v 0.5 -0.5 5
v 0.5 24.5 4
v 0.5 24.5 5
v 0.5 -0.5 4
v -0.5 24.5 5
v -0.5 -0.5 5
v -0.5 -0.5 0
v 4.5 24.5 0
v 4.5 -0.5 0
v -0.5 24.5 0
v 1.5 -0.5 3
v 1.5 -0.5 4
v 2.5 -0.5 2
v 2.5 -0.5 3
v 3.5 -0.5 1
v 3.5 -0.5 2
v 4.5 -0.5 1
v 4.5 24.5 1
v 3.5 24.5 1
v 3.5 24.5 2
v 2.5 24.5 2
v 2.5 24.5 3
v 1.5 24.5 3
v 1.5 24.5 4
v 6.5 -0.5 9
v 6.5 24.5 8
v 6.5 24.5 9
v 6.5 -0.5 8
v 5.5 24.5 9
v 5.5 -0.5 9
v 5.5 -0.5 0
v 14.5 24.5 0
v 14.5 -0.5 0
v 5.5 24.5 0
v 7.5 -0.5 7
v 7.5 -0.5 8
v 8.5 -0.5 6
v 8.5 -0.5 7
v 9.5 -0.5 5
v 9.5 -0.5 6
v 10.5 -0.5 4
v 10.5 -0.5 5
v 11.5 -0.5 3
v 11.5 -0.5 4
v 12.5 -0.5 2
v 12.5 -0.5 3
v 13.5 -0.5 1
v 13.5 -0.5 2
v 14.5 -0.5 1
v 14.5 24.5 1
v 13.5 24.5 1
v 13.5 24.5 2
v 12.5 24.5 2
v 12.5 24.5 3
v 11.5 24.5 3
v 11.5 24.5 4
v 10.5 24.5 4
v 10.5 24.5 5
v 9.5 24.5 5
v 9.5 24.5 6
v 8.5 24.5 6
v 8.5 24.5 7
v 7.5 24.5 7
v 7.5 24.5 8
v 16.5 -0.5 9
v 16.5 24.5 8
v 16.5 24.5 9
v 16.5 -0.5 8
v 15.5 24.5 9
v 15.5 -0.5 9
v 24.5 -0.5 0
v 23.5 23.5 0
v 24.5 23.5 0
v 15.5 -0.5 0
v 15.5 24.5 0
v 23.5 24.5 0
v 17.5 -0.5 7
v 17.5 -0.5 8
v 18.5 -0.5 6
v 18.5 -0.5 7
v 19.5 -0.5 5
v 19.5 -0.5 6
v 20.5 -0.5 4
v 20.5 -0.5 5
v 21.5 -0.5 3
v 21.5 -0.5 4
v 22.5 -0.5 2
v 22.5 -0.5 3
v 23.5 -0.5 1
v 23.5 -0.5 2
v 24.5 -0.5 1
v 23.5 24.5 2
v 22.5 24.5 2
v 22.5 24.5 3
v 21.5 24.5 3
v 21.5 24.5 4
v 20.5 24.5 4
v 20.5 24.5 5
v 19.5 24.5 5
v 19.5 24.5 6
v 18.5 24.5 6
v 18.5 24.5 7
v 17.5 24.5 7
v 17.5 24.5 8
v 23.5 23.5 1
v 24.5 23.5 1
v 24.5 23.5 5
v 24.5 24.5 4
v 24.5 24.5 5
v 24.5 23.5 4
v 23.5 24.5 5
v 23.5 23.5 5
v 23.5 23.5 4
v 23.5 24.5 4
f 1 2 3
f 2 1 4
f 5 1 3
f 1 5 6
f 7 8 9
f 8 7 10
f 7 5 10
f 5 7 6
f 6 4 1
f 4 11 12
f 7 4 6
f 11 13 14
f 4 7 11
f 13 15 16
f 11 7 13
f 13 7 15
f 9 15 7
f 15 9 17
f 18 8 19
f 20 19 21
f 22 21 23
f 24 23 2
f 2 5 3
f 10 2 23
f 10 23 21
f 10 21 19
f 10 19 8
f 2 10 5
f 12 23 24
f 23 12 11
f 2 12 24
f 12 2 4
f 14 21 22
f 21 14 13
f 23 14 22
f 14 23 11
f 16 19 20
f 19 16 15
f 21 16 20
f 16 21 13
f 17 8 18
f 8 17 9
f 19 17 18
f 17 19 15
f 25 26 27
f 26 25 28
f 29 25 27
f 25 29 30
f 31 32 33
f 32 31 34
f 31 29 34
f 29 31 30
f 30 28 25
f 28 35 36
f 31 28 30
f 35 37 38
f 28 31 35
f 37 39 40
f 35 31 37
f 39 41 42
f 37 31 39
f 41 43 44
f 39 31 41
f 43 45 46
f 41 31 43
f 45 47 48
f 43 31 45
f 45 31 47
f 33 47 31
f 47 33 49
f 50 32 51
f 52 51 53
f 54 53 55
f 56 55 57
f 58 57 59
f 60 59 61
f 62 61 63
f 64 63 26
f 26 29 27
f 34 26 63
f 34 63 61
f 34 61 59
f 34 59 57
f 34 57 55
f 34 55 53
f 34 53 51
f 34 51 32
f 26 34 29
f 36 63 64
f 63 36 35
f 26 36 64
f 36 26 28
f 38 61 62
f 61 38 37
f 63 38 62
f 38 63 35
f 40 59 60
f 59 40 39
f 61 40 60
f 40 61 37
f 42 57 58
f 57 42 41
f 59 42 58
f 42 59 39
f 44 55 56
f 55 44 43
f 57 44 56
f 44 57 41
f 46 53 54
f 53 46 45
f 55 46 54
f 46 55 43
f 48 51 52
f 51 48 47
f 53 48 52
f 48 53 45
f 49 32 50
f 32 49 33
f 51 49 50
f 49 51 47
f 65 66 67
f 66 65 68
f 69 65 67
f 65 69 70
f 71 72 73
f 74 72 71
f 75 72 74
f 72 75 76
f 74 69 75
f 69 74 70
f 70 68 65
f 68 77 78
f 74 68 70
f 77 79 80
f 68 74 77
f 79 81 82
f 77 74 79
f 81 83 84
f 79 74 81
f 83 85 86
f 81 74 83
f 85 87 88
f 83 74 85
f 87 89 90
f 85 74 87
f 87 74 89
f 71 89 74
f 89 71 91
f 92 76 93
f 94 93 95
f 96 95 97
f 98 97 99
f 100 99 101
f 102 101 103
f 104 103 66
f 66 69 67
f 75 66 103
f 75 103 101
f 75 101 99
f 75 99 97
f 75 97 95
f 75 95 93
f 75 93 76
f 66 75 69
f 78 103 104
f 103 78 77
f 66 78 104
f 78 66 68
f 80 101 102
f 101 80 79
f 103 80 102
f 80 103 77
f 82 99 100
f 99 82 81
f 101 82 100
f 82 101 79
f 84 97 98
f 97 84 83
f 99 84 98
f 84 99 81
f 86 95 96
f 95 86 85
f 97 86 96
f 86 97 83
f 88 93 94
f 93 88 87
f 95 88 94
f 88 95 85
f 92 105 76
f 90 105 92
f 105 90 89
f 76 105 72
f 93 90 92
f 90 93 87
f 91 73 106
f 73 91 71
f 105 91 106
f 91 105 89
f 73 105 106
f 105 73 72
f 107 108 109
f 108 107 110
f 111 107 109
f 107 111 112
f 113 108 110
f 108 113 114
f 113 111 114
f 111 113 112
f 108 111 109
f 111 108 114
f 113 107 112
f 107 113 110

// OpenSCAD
union() {
    translate([0, 0, 2.5]) cube([1, 1, 5], center=true);
    translate([0, 1, 2.5]) cube([1, 1, 5], center=true);
    translate([0, 2, 2.5]) cube([1, 1, 5], center=true);
    translate([0, 3, 2.5]) cube([1, 1, 5], center=true);
    translate([0, 4, 2.5]) cube([1, 1, 5], center=true);
    translate([0, 5, 2.5]) cube([1, 1, 5], center=true);
    translate([0, 6, 2.5]) cube([1, 1, 5], center=true);
    translate([0, 7, 2.5]) cube([1, 1, 5], center=true);
    translate([0, 8, 2.5]) cube([1, 1, 5], center=true);
    translate([0, 9, 2.5]) cube([1, 1, 5], center=true);
    translate([0, 10, 2.5]) cube([1, 1, 5], center=true);
    translate([0, 11, 2.5]) cube([1, 1, 5], center=true);
    translate([0, 12, 2.5]) cube([1, 1, 5], center=true);
    translate([0, 13, 2.5]) cube([1, 1, 5], center=true);
    translate([0, 14, 2.5]) cube([1, 1, 5], center=true);
    translate([0, 15, 2.5]) cube([1, 1, 5], center=true);
    translate([0, 16, 2.5]) cube([1, 1, 5], center=true);
    translate([0, 17, 2.5]) cube([1, 1, 5], center=true);
    translate([0, 18, 2.5]) cube([1, 1, 5], center=true);
    translate([0, 19, 2.5]) cube([1, 1, 5], center=true);
    translate([0, 20, 2.5]) cube([1, 1, 5], center=true);
    translate([0, 21, 2.5]) cube([1, 1, 5], center=true);
    translate([0, 22, 2.5]) cube([1, 1, 5], center=true);
    translate([0, 23, 2.5]) cube([1, 1, 5], center=true);
    translate([0, 24, 2.5]) cube([1, 1, 5], center=true);
    translate([1, 0, 2.0]) cube([1, 1, 4], center=true);
    translate([1, 1, 2.0]) cube([1, 1, 4], center=true);
    translate([1, 2, 2.0]) cube([1, 1, 4], center=true);
    translate([1, 3, 2.0]) cube([1, 1, 4], center=true);
    translate([1, 4, 2.0]) cube([1, 1, 4], center=true);
    translate([1, 5, 2.0]) cube([1, 1, 4], center=true);
    translate([1, 6, 2.0]) cube([1, 1, 4], center=true);
    translate([1, 7, 2.0]) cube([1, 1, 4], center=true);
    translate([1, 8, 2.0]) cube([1, 1, 4], center=true);
    translate([1, 9, 2.0]) cube([1, 1, 4], center=true);
    translate([1, 10, 2.0]) cube([1, 1, 4], center=true);
    translate([1, 11, 2.0]) cube([1, 1, 4], center=true);
    translate([1, 12, 2.0]) cube([1, 1, 4], center=true);
    translate([1, 13, 2.0]) cube([1, 1, 4], center=true);
    translate([1, 14, 2.0]) cube([1, 1, 4], center=true);
    translate([1, 15, 2.0]) cube([1, 1, 4], center=true);
    translate([1, 16, 2.0]) cube([1, 1, 4], center=true);
    translate([1, 17, 2.0]) cube([1, 1, 4], center=true);
    translate([1, 18, 2.0]) cube([1, 1, 4], center=true);
    translate([1, 19, 2.0]) cube([1, 1, 4], center=true);
    translate([1, 20, 2.0]) cube([1, 1, 4], center=true);
    translate([1, 21, 2.0]) cube([1, 1, 4], center=true);
    translate([1, 22, 2.0]) cube([1, 1, 4], center=true);
    translate([1, 23, 2.0]) cube([1, 1, 4], center=true);
    translate([1, 24, 2.0]) cube([1, 1, 4], center=true);
    translate([2, 0, 1.5]) cube([1, 1, 3], center=true);
    translate([2, 1, 1.5]) cube([1, 1, 3], center=true);
    translate([2, 2, 1.5]) cube([1, 1, 3], center=true);
    translate([2, 3, 1.5]) cube([1, 1, 3], center=true);
    translate([2, 4, 1.5]) cube([1, 1, 3], center=true);
    translate([2, 5, 1.5]) cube([1, 1, 3], center=true);
    translate([2, 6, 1.5]) cube([1, 1, 3], center=true);
    translate([2, 7, 1.5]) cube([1, 1, 3], center=true);
    translate([2, 8, 1.5]) cube([1, 1, 3], center=true);
    translate([2, 9, 1.5]) cube([1, 1, 3], center=true);
    translate([2, 10, 1.5]) cube([1, 1, 3], center=true);
    translate([2, 11, 1.5]) cube([1, 1, 3], center=true);
    translate([2, 12, 1.5]) cube([1, 1, 3], center=true);
    translate([2, 13, 1.5]) cube([1, 1, 3], center=true);
    translate([2, 14, 1.5]) cube([1, 1, 3], center=true);
    translate([2, 15, 1.5]) cube([1, 1, 3], center=true);
    translate([2, 16, 1.5]) cube([1, 1, 3], center=true);
    translate([2, 17, 1.5]) cube([1, 1, 3], center=true);
    translate([2, 18, 1.5]) cube([1, 1, 3], center=true);
    translate([2, 19, 1.5]) cube([1, 1, 3], center=true);
    translate([2, 20, 1.5]) cube([1, 1, 3], center=true);
    translate([2, 21, 1.5]) cube([1, 1, 3], center=true);
    translate([2, 22, 1.5]) cube([1, 1, 3], center=true);
    translate([2, 23, 1.5]) cube([1, 1, 3], center=true);
    translate([2, 24, 1.5]) cube([1, 1, 3], center=true);
    translate([3, 0, 1.0]) cube([1, 1, 2], center=true);
    translate([3, 1, 1.0]) cube([1, 1, 2], center=true);
    translate([3, 2, 1.0]) cube([1, 1, 2], center=true);
    translate([3, 3, 1.0]) cube([1, 1, 2], center=true);
    translate([3, 4, 1.0]) cube([1, 1, 2], center=true);
    translate([3, 5, 1.0]) cube([1, 1, 2], center=true);
    translate([3, 6, 1.0]) cube([1, 1, 2], center=true);
    translate([3, 7, 1.0]) cube([1, 1, 2], center=true);
    translate([3, 8, 1.0]) cube([1, 1, 2], center=true);
    translate([3, 9, 1.0]) cube([1, 1, 2], center=true);
    translate([3, 10, 1.0]) cube([1, 1, 2], center=true);
    translate([3, 11, 1.0]) cube([1, 1, 2], center=true);
    translate([3, 12, 1.0]) cube([1, 1, 2], center=true);
    translate([3, 13, 1.0]) cube([1, 1, 2], center=true);
    translate([3, 14, 1.0]) cube([1, 1, 2], center=true);
    translate([3, 15, 1.0]) cube([1, 1, 2], center=true);
    translate([3, 16, 1.0]) cube([1, 1, 2], center=true);
    translate([3, 17, 1.0]) cube([1, 1, 2], center=true);
    translate([3, 18, 1.0]) cube([1, 1, 2], center=true);
    translate([3, 19, 1.0]) cube([1, 1, 2], center=true);
    translate([3, 20, 1.0]) cube([1, 1, 2], center=true);
    translate([3, 21, 1.0]) cube([1, 1, 2], center=true);
    translate([3, 22, 1.0]) cube([1, 1, 2], center=true);
    translate([3, 23, 1.0]) cube([1, 1, 2], center=true);
    translate([3, 24, 1.0]) cube([1, 1, 2], center=true);
    translate([4, 0, 0.5]) cube([1, 1, 1], center=true);
    translate([4, 1, 0.5]) cube([1, 1, 1], center=true);
    translate([4, 2, 0.5]) cube([1, 1, 1], center=true);
    translate([4, 3, 0.5]) cube([1, 1, 1], center=true);
    translate([4, 4, 0.5]) cube([1, 1, 1], center=true);
    translate([4, 5, 0.5]) cube([1, 1, 1], center=true);
    translate([4, 6, 0.5]) cube([1, 1, 1], center=true);
    translate([4, 7, 0.5]) cube([1, 1, 1], center=true);
    translate([4, 8, 0.5]) cube([1, 1, 1], center=true);
    translate([4, 9, 0.5]) cube([1, 1, 1], center=true);
    translate([4, 10, 0.5]) cube([1, 1, 1], center=true);
    translate([4, 11, 0.5]) cube([1, 1, 1], center=true);
    translate([4, 12, 0.5]) cube([1, 1, 1], center=true);
    translate([4, 13, 0.5]) cube([1, 1, 1], center=true);
    translate([4, 14, 0.5]) cube([1, 1, 1], center=true);
    translate([4, 15, 0.5]) cube([1, 1, 1], center=true);
    translate([4, 16, 0.5]) cube([1, 1, 1], center=true);
    translate([4, 17, 0.5]) cube([1, 1, 1], center=true);
    translate([4, 18, 0.5]) cube([1, 1, 1], center=true);
    translate([4, 19, 0.5]) cube([1, 1, 1], center=true);
    translate([4, 20, 0.5]) cube([1, 1, 1], center=true);
    translate([4, 21, 0.5]) cube([1, 1, 1], center=true);
    translate([4, 22, 0.5]) cube([1, 1, 1], center=true);
    translate([4, 23, 0.5]) cube([1, 1, 1], center=true);
    translate([4, 24, 0.5]) cube([1, 1, 1], center=true);
    translate([6, 0, 4.5]) cube([1, 1, 9], center=true);
    translate([6, 1, 4.5]) cube([1, 1, 9], center=true);
    translate([6, 2, 4.5]) cube([1, 1, 9], center=true);
    translate([6, 3, 4.5]) cube([1, 1, 9], center=true);
    translate([6, 4, 4.5]) cube([1, 1, 9], center=true);
    translate([6, 5, 4.5]) cube([1, 1, 9], center=true);
    translate([6, 6, 4.5]) cube([1, 1, 9], center=true);
    translate([6, 7, 4.5]) cube([1, 1, 9], center=true);
    translate([6, 8, 4.5]) cube([1, 1, 9], center=true);
    translate([6, 9, 4.5]) cube([1, 1, 9], center=true);
    translate([6, 10, 4.5]) cube([1, 1, 9], center=true);
    translate([6, 11, 4.5]) cube([1, 1, 9], center=true);
    translate([6, 12, 4.5]) cube([1, 1, 9], center=true);
    translate([6, 13, 4.5]) cube([1, 1, 9], center=true);
    translate([6, 14, 4.5]) cube([1, 1, 9], center=true);
    translate([6, 15, 4.5]) cube([1, 1, 9], center=true);
    translate([6, 16, 4.5]) cube([1, 1, 9], center=true);
    translate([6, 17, 4.5]) cube([1, 1, 9], center=true);
    translate([6, 18, 4.5]) cube([1, 1, 9], center=true);
    translate([6, 19, 4.5]) cube([1, 1, 9], center=true);
    translate([6, 20, 4.5]) cube([1, 1, 9], center=true);
    translate([6, 21, 4.5]) cube([1, 1, 9], center=true);
    translate([6, 22, 4.5]) cube([1, 1, 9], center=true);
    translate([6, 23, 4.5]) cube([1, 1, 9], center=true);
    translate([6, 24, 4.5]) cube([1, 1, 9], center=true);
    translate([7, 0, 4.0]) cube([1, 1, 8], center=true);
    translate([7, 1, 4.0]) cube([1, 1, 8], center=true);
    translate([7, 2, 4.0]) cube([1, 1, 8], center=true);
    translate([7, 3, 4.0]) cube([1, 1, 8], center=true);
    translate([7, 4, 4.0]) cube([1, 1, 8], center=true);
    translate([7, 5, 4.0]) cube([1, 1, 8], center=true);
    translate([7, 6, 4.0]) cube([1, 1, 8], center=true);
    translate([7, 7, 4.0]) cube([1, 1, 8], center=true);
    translate([7, 8, 4.0]) cube([1, 1, 8], center=true);
    translate([7, 9, 4.0]) cube([1, 1, 8], center=true);
    translate([7, 10, 4.0]) cube([1, 1, 8], center=true);
    translate([7, 11, 4.0]) cube([1, 1, 8], center=true);
    translate([7, 12, 4.0]) cube([1, 1, 8], center=true);
    translate([7, 13, 4.0]) cube([1, 1, 8], center=true);
    translate([7, 14, 4.0]) cube([1, 1, 8], center=true);
    translate([7, 15, 4.0]) cube([1, 1, 8], center=true);
    translate([7, 16, 4.0]) cube([1, 1, 8], center=true);
    translate([7, 17, 4.0]) cube([1, 1, 8], center=true);
    translate([7, 18, 4.0]) cube([1, 1, 8], center=true);
    translate([7, 19, 4.0]) cube([1, 1, 8], center=true);
    translate([7, 20, 4.0]) cube([1, 1, 8], center=true);
    translate([7, 21, 4.0]) cube([1, 1, 8], center=true);
    translate([7, 22, 4.0]) cube([1, 1, 8], center=true);
    translate([7, 23, 4.0]) cube([1, 1, 8], center=true);
    translate([7, 24, 4.0]) cube([1, 1, 8], center=true);
    translate([8, 0, 3.5]) cube([1, 1, 7], center=true);
    translate([8, 1, 3.5]) cube([1, 1, 7], center=true);
    translate([8, 2, 3.5]) cube([1, 1, 7], center=true);
    translate([8, 3, 3.5]) cube([1, 1, 7], center=true);
    translate([8, 4, 3.5]) cube([1, 1, 7], center=true);
    translate([8, 5, 3.5]) cube([1, 1, 7], center=true);
    translate([8, 6, 3.5]) cube([1, 1, 7], center=true);
    translate([8, 7, 3.5]) cube([1, 1, 7], center=true);
    translate([8, 8, 3.5]) cube([1, 1, 7], center=true);
    translate([8, 9, 3.5]) cube([1, 1, 7], center=true);
    translate([8, 10, 3.5]) cube([1, 1, 7], center=true);
    translate([8, 11, 3.5]) cube([1, 1, 7], center=true);
    translate([8, 12, 3.5]) cube([1, 1, 7], center=true);
    translate([8, 13, 3.5]) cube([1, 1, 7], center=true);
    translate([8, 14, 3.5]) cube([1, 1, 7], center=true);
    translate([8, 15, 3.5]) cube([1, 1, 7], center=true);
    translate([8, 16, 3.5]) cube([1, 1, 7], center=true);
    translate([8, 17, 3.5]) cube([1, 1, 7], center=true);
    translate([8, 18, 3.5]) cube([1, 1, 7], center=true);
    translate([8, 19, 3.5]) cube([1, 1, 7], center=true);
    translate([8, 20, 3.5]) cube([1, 1, 7], center=true);
    translate([8, 21, 3.5]) cube([1, 1, 7], center=true);
    translate([8, 22, 3.5]) cube([1, 1, 7], center=true);
    translate([8, 23, 3.5]) cube([1, 1, 7], center=true);
    translate([8, 24, 3.5]) cube([1, 1, 7], center=true);
    translate([9, 0, 3.0]) cube([1, 1, 6], center=true);
    translate([9, 1, 3.0]) cube([1, 1, 6], center=true);
    translate([9, 2, 3.0]) cube([1, 1, 6], center=true);
    translate([9, 3, 3.0]) cube([1, 1, 6], center=true);
    translate([9, 4, 3.0]) cube([1, 1, 6], center=true);
    translate([9, 5, 3.0]) cube([1, 1, 6], center=true);
    translate([9, 6, 3.0]) cube([1, 1, 6], center=true);
    translate([9, 7, 3.0]) cube([1, 1, 6], center=true);
    translate([9, 8, 3.0]) cube([1, 1, 6], center=true);
    translate([9, 9, 3.0]) cube([1, 1, 6], center=true);
    translate([9, 10, 3.0]) cube([1, 1, 6], center=true);
    translate([9, 11, 3.0]) cube([1, 1, 6], center=true);
    translate([9, 12, 3.0]) cube([1, 1, 6], center=true);
    translate([9, 13, 3.0]) cube([1, 1, 6], center=true);
    translate([9, 14, 3.0]) cube([1, 1, 6], center=true);
    translate([9, 15, 3.0]) cube([1, 1, 6], center=true);
    translate([9, 16, 3.0]) cube([1, 1, 6], center=true);
    translate([9, 17, 3.0]) cube([1, 1, 6], center=true);
    translate([9, 18, 3.0]) cube([1, 1, 6], center=true);
    translate([9, 19, 3.0]) cube([1, 1, 6], center=true);
    translate([9, 20, 3.0]) cube([1, 1, 6], center=true);
    translate([9, 21, 3.0]) cube([1, 1, 6], center=true);
    translate([9, 22, 3.0]) cube([1, 1, 6], center=true);
    translate([9, 23, 3.0]) cube([1, 1, 6], center=true);
    translate([9, 24, 3.0]) cube([1, 1, 6], center=true);
    translate([10, 0, 2.5]) cube([1, 1, 5], center=true);
    translate([10, 1, 2.5]) cube([1, 1, 5], center=true);
    translate([10, 2, 2.5]) cube([1, 1, 5], center=true);
    translate([10, 3, 2.5]) cube([1, 1, 5], center=true);
    translate([10, 4, 2.5]) cube([1, 1, 5], center=true);
    translate([10, 5, 2.5]) cube([1, 1, 5], center=true);
    translate([10, 6, 2.5]) cube([1, 1, 5], center=true);
    translate([10, 7, 2.5]) cube([1, 1, 5], center=true);
    translate([10, 8, 2.5]) cube([1, 1, 5], center=true);
    translate([10, 9, 2.5]) cube([1, 1, 5], center=true);
    translate([10, 10, 2.5]) cube([1, 1, 5], center=true);
    translate([10, 11, 2.5]) cube([1, 1, 5], center=true);
    translate([10, 12, 2.5]) cube([1, 1, 5], center=true);
    translate([10, 13, 2.5]) cube([1, 1, 5], center=true);
    translate([10, 14, 2.5]) cube([1, 1, 5], center=true);
    translate([10, 15, 2.5]) cube([1, 1, 5], center=true);
    translate([10, 16, 2.5]) cube([1, 1, 5], center=true);
    translate([10, 17, 2.5]) cube([1, 1, 5], center=true);
    translate([10, 18, 2.5]) cube([1, 1, 5], center=true);
    translate([10, 19, 2.5]) cube([1, 1, 5], center=true);
    translate([10, 20, 2.5]) cube([1, 1, 5], center=true);
    translate([10, 21, 2.5]) cube([1, 1, 5], center=true);
    translate([10, 22, 2.5]) cube([1, 1, 5], center=true);
    translate([10, 23, 2.5]) cube([1, 1, 5], center=true);
    translate([10, 24, 2.5]) cube([1, 1, 5], center=true);
    translate([11, 0, 2.0]) cube([1, 1, 4], center=true);
    translate([11, 1, 2.0]) cube([1, 1, 4], center=true);
    translate([11, 2, 2.0]) cube([1, 1, 4], center=true);
    translate([11, 3, 2.0]) cube([1, 1, 4], center=true);
    translate([11, 4, 2.0]) cube([1, 1, 4], center=true);
    translate([11, 5, 2.0]) cube([1, 1, 4], center=true);
    translate([11, 6, 2.0]) cube([1, 1, 4], center=true);
    translate([11, 7, 2.0]) cube([1, 1, 4], center=true);
    translate([11, 8, 2.0]) cube([1, 1, 4], center=true);
    translate([11, 9, 2.0]) cube([1, 1, 4], center=true);
    translate([11, 10, 2.0]) cube([1, 1, 4], center=true);
    translate([11, 11, 2.0]) cube([1, 1, 4], center=true);
    translate([11, 12, 2.0]) cube([1, 1, 4], center=true);
    translate([11, 13, 2.0]) cube([1, 1, 4], center=true);
    translate([11, 14, 2.0]) cube([1, 1, 4], center=true);
    translate([11, 15, 2.0]) cube([1, 1, 4], center=true);
    translate([11, 16, 2.0]) cube([1, 1, 4], center=true);
    translate([11, 17, 2.0]) cube([1, 1, 4], center=true);
    translate([11, 18, 2.0]) cube([1, 1, 4], center=true);
    translate([11, 19, 2.0]) cube([1, 1, 4], center=true);
    translate([11, 20, 2.0]) cube([1, 1, 4], center=true);
    translate([11, 21, 2.0]) cube([1, 1, 4], center=true);
    translate([11, 22, 2.0]) cube([1, 1, 4], center=true);
    translate([11, 23, 2.0]) cube([1, 1, 4], center=true);
    translate([11, 24, 2.0]) cube([1, 1, 4], center=true);
    translate([12, 0, 1.5]) cube([1, 1, 3], center=true);
    translate([12, 1, 1.5]) cube([1, 1, 3], center=true);
    translate([12, 2, 1.5]) cube([1, 1, 3], center=true);
    translate([12, 3, 1.5]) cube([1, 1, 3], center=true);
    translate([12, 4, 1.5]) cube([1, 1, 3], center=true);
    translate([12, 5, 1.5]) cube([1, 1, 3], center=true);
    translate([12, 6, 1.5]) cube([1, 1, 3], center=true);
    translate([12, 7, 1.5]) cube([1, 1, 3], center=true);
    translate([12, 8, 1.5]) cube([1, 1, 3], center=true);
    translate([12, 9, 1.5]) cube([1, 1, 3], center=true);
    translate([12, 10, 1.5]) cube([1, 1, 3], center=true);
    translate([12, 11, 1.5]) cube([1, 1, 3], center=true);
    translate([12, 12, 1.5]) cube([1, 1, 3], center=true);
    translate([12, 13, 1.5]) cube([1, 1, 3], center=true);
    translate([12, 14, 1.5]) cube([1, 1, 3], center=true);
    translate([12, 15, 1.5]) cube([1, 1, 3], center=true);
    translate([12, 16, 1.5]) cube([1, 1, 3], center=true);
    translate([12, 17, 1.5]) cube([1, 1, 3], center=true);
    translate([12, 18, 1.5]) cube([1, 1, 3], center=true);
    translate([12, 19, 1.5]) cube([1, 1, 3], center=true);
    translate([12, 20, 1.5]) cube([1, 1, 3], center=true);
    translate([12, 21, 1.5]) cube([1, 1, 3], center=true);
    translate([12, 22, 1.5]) cube([1, 1, 3], center=true);
    translate([12, 23, 1.5]) cube([1, 1, 3], center=true);
    translate([12, 24, 1.5]) cube([1, 1, 3], center=true);
    translate([13, 0, 1.0]) cube([1, 1, 2], center=true);
    translate([13, 1, 1.0]) cube([1, 1, 2], center=true);
    translate([13, 2, 1.0]) cube([1, 1, 2], center=true);
    translate([13, 3, 1.0]) cube([1, 1, 2], center=true);
    translate([13, 4, 1.0]) cube([1, 1, 2], center=true);
    translate([13, 5, 1.0]) cube([1, 1, 2], center=true);
    translate([13, 6, 1.0]) cube([1, 1, 2], center=true);
    translate([13, 7, 1.0]) cube([1, 1, 2], center=true);
    translate([13, 8, 1.0]) cube([1, 1, 2], center=true);
    translate([13, 9, 1.0]) cube([1, 1, 2], center=true);
    translate([13, 10, 1.0]) cube([1, 1, 2], center=true);
    translate([13, 11, 1.0]) cube([1, 1, 2], center=true);
    translate([13, 12, 1.0]) cube([1, 1, 2], center=true);
    translate([13, 13, 1.0]) cube([1, 1, 2], center=true);
    translate([13, 14, 1.0]) cube([1, 1, 2], center=true);
    translate([13, 15, 1.0]) cube([1, 1, 2], center=true);
    translate([13, 16, 1.0]) cube([1, 1, 2], center=true);
    translate([13, 17, 1.0]) cube([1, 1, 2], center=true);
    translate([13, 18, 1.0]) cube([1, 1, 2], center=true);
    translate([13, 19, 1.0]) cube([1, 1, 2], center=true);
    translate([13, 20, 1.0]) cube([1, 1, 2], center=true);
    translate([13, 21, 1.0]) cube([1, 1, 2], center=true);
    translate([13, 22, 1.0]) cube([1, 1, 2], center=true);
    translate([13, 23, 1.0]) cube([1, 1, 2], center=true);
    translate([13, 24, 1.0]) cube([1, 1, 2], center=true);
    translate([14, 0, 0.5]) cube([1, 1, 1], center=true);
    translate([14, 1, 0.5]) cube([1, 1, 1], center=true);
    translate([14, 2, 0.5]) cube([1, 1, 1], center=true);
    translate([14, 3, 0.5]) cube([1, 1, 1], center=true);
    translate([14, 4, 0.5]) cube([1, 1, 1], center=true);
    translate([14, 5, 0.5]) cube([1, 1, 1], center=true);
    translate([14, 6, 0.5]) cube([1, 1, 1], center=true);
    translate([14, 7, 0.5]) cube([1, 1, 1], center=true);
    translate([14, 8, 0.5]) cube([1, 1, 1], center=true);
    translate([14, 9, 0.5]) cube([1, 1, 1], center=true);
    translate([14, 10, 0.5]) cube([1, 1, 1], center=true);
    translate([14, 11, 0.5]) cube([1, 1, 1], center=true);
    translate([14, 12, 0.5]) cube([1, 1, 1], center=true);
    translate([14, 13, 0.5]) cube([1, 1, 1], center=true);
    translate([14, 14, 0.5]) cube([1, 1, 1], center=true);
    translate([14, 15, 0.5]) cube([1, 1, 1], center=true);
    translate([14, 16, 0.5]) cube([1, 1, 1], center=true);
    translate([14, 17, 0.5]) cube([1, 1, 1], center=true);
    translate([14, 18, 0.5]) cube([1, 1, 1], center=true);
    translate([14, 19, 0.5]) cube([1, 1, 1], center=true);
    translate([14, 20, 0.5]) cube([1, 1, 1], center=true);
    translate([14, 21, 0.5]) cube([1, 1, 1], center=true);
    translate([14, 22, 0.5]) cube([1, 1, 1], center=true);
    translate([14, 23, 0.5]) cube([1, 1, 1], center=true);
    translate([14, 24, 0.5]) cube([1, 1, 1], center=true);
    translate([16, 0, 4.5]) cube([1, 1, 9], center=true);
    translate([16, 1, 4.5]) cube([1, 1, 9], center=true);
    translate([16, 2, 4.5]) cube([1, 1, 9], center=true);
    translate([16, 3, 4.5]) cube([1, 1, 9], center=true);
    translate([16, 4, 4.5]) cube([1, 1, 9], center=true);
    translate([16, 5, 4.5]) cube([1, 1, 9], center=true);
    translate([16, 6, 4.5]) cube([1, 1, 9], center=true);
    translate([16, 7, 4.5]) cube([1, 1, 9], center=true);
    translate([16, 8, 4.5]) cube([1, 1, 9], center=true);
    translate([16, 9, 4.5]) cube([1, 1, 9], center=true);
    translate([16, 10, 4.5]) cube([1, 1, 9], center=true);
    translate([16, 11, 4.5]) cube([1, 1, 9], center=true);
    translate([16, 12, 4.5]) cube([1, 1, 9], center=true);
    translate([16, 13, 4.5]) cube([1, 1, 9], center=true);
    translate([16, 14, 4.5]) cube([1, 1, 9], center=true);
    translate([16, 15, 4.5]) cube([1, 1, 9], center=true);
    translate([16, 16, 4.5]) cube([1, 1, 9], center=true);
    translate([16, 17, 4.5]) cube([1, 1, 9], center=true);
    translate([16, 18, 4.5]) cube([1, 1, 9], center=true);
    translate([16, 19, 4.5]) cube([1, 1, 9], center=true);
    translate([16, 20, 4.5]) cube([1, 1, 9], center=true);
    translate([16, 21, 4.5]) cube([1, 1, 9], center=true);
    translate([16, 22, 4.5]) cube([1, 1, 9], center=true);
    translate([16, 23, 4.5]) cube([1, 1, 9], center=true);
    translate([16, 24, 4.5]) cube([1, 1, 9], center=true);
    translate([17, 0, 4.0]) cube([1, 1, 8], center=true);
    translate([17, 1, 4.0]) cube([1, 1, 8], center=true);
    translate([17, 2, 4.0]) cube([1, 1, 8], center=true);
    translate([17, 3, 4.0]) cube([1, 1, 8], center=true);
    translate([17, 4, 4.0]) cube([1, 1, 8], center=true);
    translate([17, 5, 4.0]) cube([1, 1, 8], center=true);
    translate([17, 6, 4.0]) cube([1, 1, 8], center=true);
    translate([17, 7, 4.0]) cube([1, 1, 8], center=true);
    translate([17, 8, 4.0]) cube([1, 1, 8], center=true);
    translate([17, 9, 4.0]) cube([1, 1, 8], center=true);
    translate([17, 10, 4.0]) cube([1, 1, 8], center=true);
    translate([17, 11, 4.0]) cube([1, 1, 8], center=true);
    translate([17, 12, 4.0]) cube([1, 1, 8], center=true);
    translate([17, 13, 4.0]) cube([1, 1, 8], center=true);
    translate([17, 14, 4.0]) cube([1, 1, 8], center=true);
    translate([17, 15, 4.0]) cube([1, 1, 8], center=true);
    translate([17, 16, 4.0]) cube([1, 1, 8], center=true);
    translate([17, 17, 4.0]) cube([1, 1, 8], center=true);
    translate([17, 18, 4.0]) cube([1, 1, 8], center=true);
    translate([17, 19, 4.0]) cube([1, 1, 8], center=true);
    translate([17, 20, 4.0]) cube([1, 1, 8], center=true);
    translate([17, 21, 4.0]) cube([1, 1, 8], center=true);
    translate([17, 22, 4.0]) cube([1, 1, 8], center=true);
    translate([17, 23, 4.0]) cube([1, 1, 8], center=true);
    translate([17, 24, 4.0]) cube([1, 1, 8], center=true);
    translate([18, 0, 3.5]) cube([1, 1, 7], center=true);
    translate([18, 1, 3.5]) cube([1, 1, 7], center=true);
    translate([18, 2, 3.5]) cube([1, 1, 7], center=true);
    translate([18, 3, 3.5]) cube([1, 1, 7], center=true);
    translate([18, 4, 3.5]) cube([1, 1, 7], center=true);
    translate([18, 5, 3.5]) cube([1, 1, 7], center=true);
    translate([18, 6, 3.5]) cube([1, 1, 7], center=true);
    translate([18, 7, 3.5]) cube([1, 1, 7], center=true);
    translate([18, 8, 3.5]) cube([1, 1, 7], center=true);
    translate([18, 9, 3.5]) cube([1, 1, 7], center=true);
    translate([18, 10, 3.5]) cube([1, 1, 7], center=true);
    translate([18, 11, 3.5]) cube([1, 1, 7], center=true);
    translate([18, 12, 3.5]) cube([1, 1, 7], center=true);
    translate([18, 13, 3.5]) cube([1, 1, 7], center=true);
    translate([18, 14, 3.5]) cube([1, 1, 7], center=true);
    translate([18, 15, 3.5]) cube([1, 1, 7], center=true);
    translate([18, 16, 3.5]) cube([1, 1, 7], center=true);
    translate([18, 17, 3.5]) cube([1, 1, 7], center=true);
    translate([18, 18, 3.5]) cube([1, 1, 7], center=true);
    translate([18, 19, 3.5]) cube([1, 1, 7], center=true);
    translate([18, 20, 3.5]) cube([1, 1, 7], center=true);
    translate([18, 21, 3.5]) cube([1, 1, 7], center=true);
    translate([18, 22, 3.5]) cube([1, 1, 7], center=true);
    translate([18, 23, 3.5]) cube([1, 1, 7], center=true);
    translate([18, 24, 3.5]) cube([1, 1, 7], center=true);
    translate([19, 0, 3.0]) cube([1, 1, 6], center=true);
    translate([19, 1, 3.0]) cube([1, 1, 6], center=true);
    translate([19, 2, 3.0]) cube([1, 1, 6], center=true);
    translate([19, 3, 3.0]) cube([1, 1, 6], center=true);
    translate([19, 4, 3.0]) cube([1, 1, 6], center=true);
    translate([19, 5, 3.0]) cube([1, 1, 6], center=true);
    translate([19, 6, 3.0]) cube([1, 1, 6], center=true);
    translate([19, 7, 3.0]) cube([1, 1, 6], center=true);
    translate([19, 8, 3.0]) cube([1, 1, 6], center=true);
    translate([19, 9, 3.0]) cube([1, 1, 6], center=true);
    translate([19, 10, 3.0]) cube([1, 1, 6], center=true);
    translate([19, 11, 3.0]) cube([1, 1, 6], center=true);
    translate([19, 12, 3.0]) cube([1, 1, 6], center=true);
    translate([19, 13, 3.0]) cube([1, 1, 6], center=true);
    translate([19, 14, 3.0]) cube([1, 1, 6], center=true);
    translate([19, 15, 3.0]) cube([1, 1, 6], center=true);
    translate([19, 16, 3.0]) cube([1, 1, 6], center=true);
    translate([19, 17, 3.0]) cube([1, 1, 6], center=true);
    translate([19, 18, 3.0]) cube([1, 1, 6], center=true);
    translate([19, 19, 3.0]) cube([1, 1, 6], center=true);
    translate([19, 20, 3.0]) cube([1, 1, 6], center=true);
    translate([19, 21, 3.0]) cube([1, 1, 6], center=true);
    translate([19, 22, 3.0]) cube([1, 1, 6], center=true);
    translate([19, 23, 3.0]) cube([1, 1, 6], center=true);
    translate([19, 24, 3.0]) cube([1, 1, 6], center=true);
    translate([20, 0, 2.5]) cube([1, 1, 5], center=true);
    translate([20, 1, 2.5]) cube([1, 1, 5], center=true);
    translate([20, 2, 2.5]) cube([1, 1, 5], center=true);
    translate([20, 3, 2.5]) cube([1, 1, 5], center=true);
    translate([20, 4, 2.5]) cube([1, 1, 5], center=true);
    translate([20, 5, 2.5]) cube([1, 1, 5], center=true);
    translate([20, 6, 2.5]) cube([1, 1, 5], center=true);
    translate([20, 7, 2.5]) cube([1, 1, 5], center=true);
    translate([20, 8, 2.5]) cube([1, 1, 5], center=true);
    translate([20, 9, 2.5]) cube([1, 1, 5], center=true);
    translate([20, 10, 2.5]) cube([1, 1, 5], center=true);
    translate([20, 11, 2.5]) cube([1, 1, 5], center=true);
    translate([20, 12, 2.5]) cube([1, 1, 5], center=true);
    translate([20, 13, 2.5]) cube([1, 1, 5], center=true);
    translate([20, 14, 2.5]) cube([1, 1, 5], center=true);
    translate([20, 15, 2.5]) cube([1, 1, 5], center=true);
    translate([20, 16, 2.5]) cube([1, 1, 5], center=true);
    translate([20, 17, 2.5]) cube([1, 1, 5], center=true);
    translate([20, 18, 2.5]) cube([1, 1, 5], center=true);
    translate([20, 19, 2.5]) cube([1, 1, 5], center=true);
    translate([20, 20, 2.5]) cube([1, 1, 5], center=true);
    translate([20, 21, 2.5]) cube([1, 1, 5], center=true);
    translate([20, 22, 2.5]) cube([1, 1, 5], center=true);
    translate([20, 23, 2.5]) cube([1, 1, 5], center=true);
    translate([20, 24, 2.5]) cube([1, 1, 5], center=true);
    translate([21, 0, 2.0]) cube([1, 1, 4], center=true);
    translate([21, 1, 2.0]) cube([1, 1, 4], center=true);
    translate([21, 2, 2.0]) cube([1, 1, 4], center=true);
    translate([21, 3, 2.0]) cube([1, 1, 4], center=true);
    translate([21, 4, 2.0]) cube([1, 1, 4], center=true);
    translate([21, 5, 2.0]) cube([1, 1, 4], center=true);
    translate([21, 6, 2.0]) cube([1, 1, 4], center=true);
    translate([21, 7, 2.0]) cube([1, 1, 4], center=true);
    translate([21, 8, 2.0]) cube([1, 1, 4], center=true);
    translate([21, 9, 2.0]) cube([1, 1, 4], center=true);
    translate([21, 10, 2.0]) cube([1, 1, 4], center=true);
    translate([21, 11, 2.0]) cube([1, 1, 4], center=true);
    translate([21, 12, 2.0]) cube([1, 1, 4], center=true);
    translate([21, 13, 2.0]) cube([1, 1, 4], center=true);
    translate([21, 14, 2.0]) cube([1, 1, 4], center=true);
    translate([21, 15, 2.0]) cube([1, 1, 4], center=true);
    translate([21, 16, 2.0]) cube([1, 1, 4], center=true);
    translate([21, 17, 2.0]) cube([1, 1, 4], center=true);
    translate([21, 18, 2.0]) cube([1, 1, 4], center=true);
    translate([21, 19, 2.0]) cube([1, 1, 4], center=true);
    translate([21, 20, 2.0]) cube([1, 1, 4], center=true);
    translate([21, 21, 2.0]) cube([1, 1, 4], center=true);
    translate([21, 22, 2.0]) cube([1, 1, 4], center=true);
    translate([21, 23, 2.0]) cube([1, 1, 4], center=true);
    translate([21, 24, 2.0]) cube([1, 1, 4], center=true);
    translate([22, 0, 1.5]) cube([1, 1, 3], center=true);
    translate([22, 1, 1.5]) cube([1, 1, 3], center=true);
    translate([22, 2, 1.5]) cube([1, 1, 3], center=true);
    translate([22, 3, 1.5]) cube([1, 1, 3], center=true);
    translate([22, 4, 1.5]) cube([1, 1, 3], center=true);
    translate([22, 5, 1.5]) cube([1, 1, 3], center=true);
    translate([22, 6, 1.5]) cube([1, 1, 3], center=true);
    translate([22, 7, 1.5]) cube([1, 1, 3], center=true);
    translate([22, 8, 1.5]) cube([1, 1, 3], center=true);
    translate([22, 9, 1.5]) cube([1, 1, 3], center=true);
    translate([22, 10, 1.5]) cube([1, 1, 3], center=true);
    translate([22, 11, 1.5]) cube([1, 1, 3], center=true);
    translate([22, 12, 1.5]) cube([1, 1, 3], center=true);
    translate([22, 13, 1.5]) cube([1, 1, 3], center=true);
    translate([22, 14, 1.5]) cube([1, 1, 3], center=true);
    translate([22, 15, 1.5]) cube([1, 1, 3], center=true);
    translate([22, 16, 1.5]) cube([1, 1, 3], center=true);
    translate([22, 17, 1.5]) cube([1, 1, 3], center=true);
    translate([22, 18, 1.5]) cube([1, 1, 3], center=true);
    translate([22, 19, 1.5]) cube([1, 1, 3], center=true);
    translate([22, 20, 1.5]) cube([1, 1, 3], center=true);
    translate([22, 21, 1.5]) cube([1, 1, 3], center=true);
    translate([22, 22, 1.5]) cube([1, 1, 3], center=true);
    translate([22, 23, 1.5]) cube([1, 1, 3], center=true);
    translate([22, 24, 1.5]) cube([1, 1, 3], center=true);
    translate([23, 0, 1.0]) cube([1, 1, 2], center=true);
    translate([23, 1, 1.0]) cube([1, 1, 2], center=true);
    translate([23, 2, 1.0]) cube([1, 1, 2], center=true);
    translate([23, 3, 1.0]) cube([1, 1, 2], center=true);
    translate([23, 4, 1.0]) cube([1, 1, 2], center=true);
    translate([23, 5, 1.0]) cube([1, 1, 2], center=true);
    translate([23, 6, 1.0]) cube([1, 1, 2], center=true);
    translate([23, 7, 1.0]) cube([1, 1, 2], center=true);
    translate([23, 8, 1.0]) cube([1, 1, 2], center=true);
    translate([23, 9, 1.0]) cube([1, 1, 2], center=true);
    translate([23, 10, 1.0]) cube([1, 1, 2], center=true);
    translate([23, 11, 1.0]) cube([1, 1, 2], center=true);
    translate([23, 12, 1.0]) cube([1, 1, 2], center=true);
    translate([23, 13, 1.0]) cube([1, 1, 2], center=true);
    translate([23, 14, 1.0]) cube([1, 1, 2], center=true);
    translate([23, 15, 1.0]) cube([1, 1, 2], center=true);
    translate([23, 16, 1.0]) cube([1, 1, 2], center=true);
    translate([23, 17, 1.0]) cube([1, 1, 2], center=true);
    translate([23, 18, 1.0]) cube([1, 1, 2], center=true);
    translate([23, 19, 1.0]) cube([1, 1, 2], center=true);
    translate([23, 20, 1.0]) cube([1, 1, 2], center=true);
    translate([23, 21, 1.0]) cube([1, 1, 2], center=true);
    translate([23, 22, 1.0]) cube([1, 1, 2], center=true);
    translate([23, 23, 1.0]) cube([1, 1, 2], center=true);
    translate([23, 24, 1.0]) cube([1, 1, 2], center=true);
    translate([24, 0, 0.5]) cube([1, 1, 1], center=true);
    translate([24, 1, 0.5]) cube([1, 1, 1], center=true);
    translate([24, 2, 0.5]) cube([1, 1, 1], center=true);
    translate([24, 3, 0.5]) cube([1, 1, 1], center=true);
    translate([24, 4, 0.5]) cube([1, 1, 1], center=true);
    translate([24, 5, 0.5]) cube([1, 1, 1], center=true);
    translate([24, 6, 0.5]) cube([1, 1, 1], center=true);
    translate([24, 7, 0.5]) cube([1, 1, 1], center=true);
    translate([24, 8, 0.5]) cube([1, 1, 1], center=true);
    translate([24, 9, 0.5]) cube([1, 1, 1], center=true);
    translate([24, 10, 0.5]) cube([1, 1, 1], center=true);
    translate([24, 11, 0.5]) cube([1, 1, 1], center=true);
    translate([24, 12, 0.5]) cube([1, 1, 1], center=true);
    translate([24, 13, 0.5]) cube([1, 1, 1], center=true);
    translate([24, 14, 0.5]) cube([1, 1, 1], center=true);
    translate([24, 15, 0.5]) cube([1, 1, 1], center=true);
    translate([24, 16, 0.5]) cube([1, 1, 1], center=true);
    translate([24, 17, 0.5]) cube([1, 1, 1], center=true);
    translate([24, 18, 0.5]) cube([1, 1, 1], center=true);
    translate([24, 19, 0.5]) cube([1, 1, 1], center=true);
    translate([24, 20, 0.5]) cube([1, 1, 1], center=true);
    translate([24, 21, 0.5]) cube([1, 1, 1], center=true);
    translate([24, 22, 0.5]) cube([1, 1, 1], center=true);
    translate([24, 23, 0.5]) cube([1, 1, 1], center=true);
    translate([24, 24, 4.5]) color([0, 0, 1]) cube([1, 1, 1], center=true);
}
